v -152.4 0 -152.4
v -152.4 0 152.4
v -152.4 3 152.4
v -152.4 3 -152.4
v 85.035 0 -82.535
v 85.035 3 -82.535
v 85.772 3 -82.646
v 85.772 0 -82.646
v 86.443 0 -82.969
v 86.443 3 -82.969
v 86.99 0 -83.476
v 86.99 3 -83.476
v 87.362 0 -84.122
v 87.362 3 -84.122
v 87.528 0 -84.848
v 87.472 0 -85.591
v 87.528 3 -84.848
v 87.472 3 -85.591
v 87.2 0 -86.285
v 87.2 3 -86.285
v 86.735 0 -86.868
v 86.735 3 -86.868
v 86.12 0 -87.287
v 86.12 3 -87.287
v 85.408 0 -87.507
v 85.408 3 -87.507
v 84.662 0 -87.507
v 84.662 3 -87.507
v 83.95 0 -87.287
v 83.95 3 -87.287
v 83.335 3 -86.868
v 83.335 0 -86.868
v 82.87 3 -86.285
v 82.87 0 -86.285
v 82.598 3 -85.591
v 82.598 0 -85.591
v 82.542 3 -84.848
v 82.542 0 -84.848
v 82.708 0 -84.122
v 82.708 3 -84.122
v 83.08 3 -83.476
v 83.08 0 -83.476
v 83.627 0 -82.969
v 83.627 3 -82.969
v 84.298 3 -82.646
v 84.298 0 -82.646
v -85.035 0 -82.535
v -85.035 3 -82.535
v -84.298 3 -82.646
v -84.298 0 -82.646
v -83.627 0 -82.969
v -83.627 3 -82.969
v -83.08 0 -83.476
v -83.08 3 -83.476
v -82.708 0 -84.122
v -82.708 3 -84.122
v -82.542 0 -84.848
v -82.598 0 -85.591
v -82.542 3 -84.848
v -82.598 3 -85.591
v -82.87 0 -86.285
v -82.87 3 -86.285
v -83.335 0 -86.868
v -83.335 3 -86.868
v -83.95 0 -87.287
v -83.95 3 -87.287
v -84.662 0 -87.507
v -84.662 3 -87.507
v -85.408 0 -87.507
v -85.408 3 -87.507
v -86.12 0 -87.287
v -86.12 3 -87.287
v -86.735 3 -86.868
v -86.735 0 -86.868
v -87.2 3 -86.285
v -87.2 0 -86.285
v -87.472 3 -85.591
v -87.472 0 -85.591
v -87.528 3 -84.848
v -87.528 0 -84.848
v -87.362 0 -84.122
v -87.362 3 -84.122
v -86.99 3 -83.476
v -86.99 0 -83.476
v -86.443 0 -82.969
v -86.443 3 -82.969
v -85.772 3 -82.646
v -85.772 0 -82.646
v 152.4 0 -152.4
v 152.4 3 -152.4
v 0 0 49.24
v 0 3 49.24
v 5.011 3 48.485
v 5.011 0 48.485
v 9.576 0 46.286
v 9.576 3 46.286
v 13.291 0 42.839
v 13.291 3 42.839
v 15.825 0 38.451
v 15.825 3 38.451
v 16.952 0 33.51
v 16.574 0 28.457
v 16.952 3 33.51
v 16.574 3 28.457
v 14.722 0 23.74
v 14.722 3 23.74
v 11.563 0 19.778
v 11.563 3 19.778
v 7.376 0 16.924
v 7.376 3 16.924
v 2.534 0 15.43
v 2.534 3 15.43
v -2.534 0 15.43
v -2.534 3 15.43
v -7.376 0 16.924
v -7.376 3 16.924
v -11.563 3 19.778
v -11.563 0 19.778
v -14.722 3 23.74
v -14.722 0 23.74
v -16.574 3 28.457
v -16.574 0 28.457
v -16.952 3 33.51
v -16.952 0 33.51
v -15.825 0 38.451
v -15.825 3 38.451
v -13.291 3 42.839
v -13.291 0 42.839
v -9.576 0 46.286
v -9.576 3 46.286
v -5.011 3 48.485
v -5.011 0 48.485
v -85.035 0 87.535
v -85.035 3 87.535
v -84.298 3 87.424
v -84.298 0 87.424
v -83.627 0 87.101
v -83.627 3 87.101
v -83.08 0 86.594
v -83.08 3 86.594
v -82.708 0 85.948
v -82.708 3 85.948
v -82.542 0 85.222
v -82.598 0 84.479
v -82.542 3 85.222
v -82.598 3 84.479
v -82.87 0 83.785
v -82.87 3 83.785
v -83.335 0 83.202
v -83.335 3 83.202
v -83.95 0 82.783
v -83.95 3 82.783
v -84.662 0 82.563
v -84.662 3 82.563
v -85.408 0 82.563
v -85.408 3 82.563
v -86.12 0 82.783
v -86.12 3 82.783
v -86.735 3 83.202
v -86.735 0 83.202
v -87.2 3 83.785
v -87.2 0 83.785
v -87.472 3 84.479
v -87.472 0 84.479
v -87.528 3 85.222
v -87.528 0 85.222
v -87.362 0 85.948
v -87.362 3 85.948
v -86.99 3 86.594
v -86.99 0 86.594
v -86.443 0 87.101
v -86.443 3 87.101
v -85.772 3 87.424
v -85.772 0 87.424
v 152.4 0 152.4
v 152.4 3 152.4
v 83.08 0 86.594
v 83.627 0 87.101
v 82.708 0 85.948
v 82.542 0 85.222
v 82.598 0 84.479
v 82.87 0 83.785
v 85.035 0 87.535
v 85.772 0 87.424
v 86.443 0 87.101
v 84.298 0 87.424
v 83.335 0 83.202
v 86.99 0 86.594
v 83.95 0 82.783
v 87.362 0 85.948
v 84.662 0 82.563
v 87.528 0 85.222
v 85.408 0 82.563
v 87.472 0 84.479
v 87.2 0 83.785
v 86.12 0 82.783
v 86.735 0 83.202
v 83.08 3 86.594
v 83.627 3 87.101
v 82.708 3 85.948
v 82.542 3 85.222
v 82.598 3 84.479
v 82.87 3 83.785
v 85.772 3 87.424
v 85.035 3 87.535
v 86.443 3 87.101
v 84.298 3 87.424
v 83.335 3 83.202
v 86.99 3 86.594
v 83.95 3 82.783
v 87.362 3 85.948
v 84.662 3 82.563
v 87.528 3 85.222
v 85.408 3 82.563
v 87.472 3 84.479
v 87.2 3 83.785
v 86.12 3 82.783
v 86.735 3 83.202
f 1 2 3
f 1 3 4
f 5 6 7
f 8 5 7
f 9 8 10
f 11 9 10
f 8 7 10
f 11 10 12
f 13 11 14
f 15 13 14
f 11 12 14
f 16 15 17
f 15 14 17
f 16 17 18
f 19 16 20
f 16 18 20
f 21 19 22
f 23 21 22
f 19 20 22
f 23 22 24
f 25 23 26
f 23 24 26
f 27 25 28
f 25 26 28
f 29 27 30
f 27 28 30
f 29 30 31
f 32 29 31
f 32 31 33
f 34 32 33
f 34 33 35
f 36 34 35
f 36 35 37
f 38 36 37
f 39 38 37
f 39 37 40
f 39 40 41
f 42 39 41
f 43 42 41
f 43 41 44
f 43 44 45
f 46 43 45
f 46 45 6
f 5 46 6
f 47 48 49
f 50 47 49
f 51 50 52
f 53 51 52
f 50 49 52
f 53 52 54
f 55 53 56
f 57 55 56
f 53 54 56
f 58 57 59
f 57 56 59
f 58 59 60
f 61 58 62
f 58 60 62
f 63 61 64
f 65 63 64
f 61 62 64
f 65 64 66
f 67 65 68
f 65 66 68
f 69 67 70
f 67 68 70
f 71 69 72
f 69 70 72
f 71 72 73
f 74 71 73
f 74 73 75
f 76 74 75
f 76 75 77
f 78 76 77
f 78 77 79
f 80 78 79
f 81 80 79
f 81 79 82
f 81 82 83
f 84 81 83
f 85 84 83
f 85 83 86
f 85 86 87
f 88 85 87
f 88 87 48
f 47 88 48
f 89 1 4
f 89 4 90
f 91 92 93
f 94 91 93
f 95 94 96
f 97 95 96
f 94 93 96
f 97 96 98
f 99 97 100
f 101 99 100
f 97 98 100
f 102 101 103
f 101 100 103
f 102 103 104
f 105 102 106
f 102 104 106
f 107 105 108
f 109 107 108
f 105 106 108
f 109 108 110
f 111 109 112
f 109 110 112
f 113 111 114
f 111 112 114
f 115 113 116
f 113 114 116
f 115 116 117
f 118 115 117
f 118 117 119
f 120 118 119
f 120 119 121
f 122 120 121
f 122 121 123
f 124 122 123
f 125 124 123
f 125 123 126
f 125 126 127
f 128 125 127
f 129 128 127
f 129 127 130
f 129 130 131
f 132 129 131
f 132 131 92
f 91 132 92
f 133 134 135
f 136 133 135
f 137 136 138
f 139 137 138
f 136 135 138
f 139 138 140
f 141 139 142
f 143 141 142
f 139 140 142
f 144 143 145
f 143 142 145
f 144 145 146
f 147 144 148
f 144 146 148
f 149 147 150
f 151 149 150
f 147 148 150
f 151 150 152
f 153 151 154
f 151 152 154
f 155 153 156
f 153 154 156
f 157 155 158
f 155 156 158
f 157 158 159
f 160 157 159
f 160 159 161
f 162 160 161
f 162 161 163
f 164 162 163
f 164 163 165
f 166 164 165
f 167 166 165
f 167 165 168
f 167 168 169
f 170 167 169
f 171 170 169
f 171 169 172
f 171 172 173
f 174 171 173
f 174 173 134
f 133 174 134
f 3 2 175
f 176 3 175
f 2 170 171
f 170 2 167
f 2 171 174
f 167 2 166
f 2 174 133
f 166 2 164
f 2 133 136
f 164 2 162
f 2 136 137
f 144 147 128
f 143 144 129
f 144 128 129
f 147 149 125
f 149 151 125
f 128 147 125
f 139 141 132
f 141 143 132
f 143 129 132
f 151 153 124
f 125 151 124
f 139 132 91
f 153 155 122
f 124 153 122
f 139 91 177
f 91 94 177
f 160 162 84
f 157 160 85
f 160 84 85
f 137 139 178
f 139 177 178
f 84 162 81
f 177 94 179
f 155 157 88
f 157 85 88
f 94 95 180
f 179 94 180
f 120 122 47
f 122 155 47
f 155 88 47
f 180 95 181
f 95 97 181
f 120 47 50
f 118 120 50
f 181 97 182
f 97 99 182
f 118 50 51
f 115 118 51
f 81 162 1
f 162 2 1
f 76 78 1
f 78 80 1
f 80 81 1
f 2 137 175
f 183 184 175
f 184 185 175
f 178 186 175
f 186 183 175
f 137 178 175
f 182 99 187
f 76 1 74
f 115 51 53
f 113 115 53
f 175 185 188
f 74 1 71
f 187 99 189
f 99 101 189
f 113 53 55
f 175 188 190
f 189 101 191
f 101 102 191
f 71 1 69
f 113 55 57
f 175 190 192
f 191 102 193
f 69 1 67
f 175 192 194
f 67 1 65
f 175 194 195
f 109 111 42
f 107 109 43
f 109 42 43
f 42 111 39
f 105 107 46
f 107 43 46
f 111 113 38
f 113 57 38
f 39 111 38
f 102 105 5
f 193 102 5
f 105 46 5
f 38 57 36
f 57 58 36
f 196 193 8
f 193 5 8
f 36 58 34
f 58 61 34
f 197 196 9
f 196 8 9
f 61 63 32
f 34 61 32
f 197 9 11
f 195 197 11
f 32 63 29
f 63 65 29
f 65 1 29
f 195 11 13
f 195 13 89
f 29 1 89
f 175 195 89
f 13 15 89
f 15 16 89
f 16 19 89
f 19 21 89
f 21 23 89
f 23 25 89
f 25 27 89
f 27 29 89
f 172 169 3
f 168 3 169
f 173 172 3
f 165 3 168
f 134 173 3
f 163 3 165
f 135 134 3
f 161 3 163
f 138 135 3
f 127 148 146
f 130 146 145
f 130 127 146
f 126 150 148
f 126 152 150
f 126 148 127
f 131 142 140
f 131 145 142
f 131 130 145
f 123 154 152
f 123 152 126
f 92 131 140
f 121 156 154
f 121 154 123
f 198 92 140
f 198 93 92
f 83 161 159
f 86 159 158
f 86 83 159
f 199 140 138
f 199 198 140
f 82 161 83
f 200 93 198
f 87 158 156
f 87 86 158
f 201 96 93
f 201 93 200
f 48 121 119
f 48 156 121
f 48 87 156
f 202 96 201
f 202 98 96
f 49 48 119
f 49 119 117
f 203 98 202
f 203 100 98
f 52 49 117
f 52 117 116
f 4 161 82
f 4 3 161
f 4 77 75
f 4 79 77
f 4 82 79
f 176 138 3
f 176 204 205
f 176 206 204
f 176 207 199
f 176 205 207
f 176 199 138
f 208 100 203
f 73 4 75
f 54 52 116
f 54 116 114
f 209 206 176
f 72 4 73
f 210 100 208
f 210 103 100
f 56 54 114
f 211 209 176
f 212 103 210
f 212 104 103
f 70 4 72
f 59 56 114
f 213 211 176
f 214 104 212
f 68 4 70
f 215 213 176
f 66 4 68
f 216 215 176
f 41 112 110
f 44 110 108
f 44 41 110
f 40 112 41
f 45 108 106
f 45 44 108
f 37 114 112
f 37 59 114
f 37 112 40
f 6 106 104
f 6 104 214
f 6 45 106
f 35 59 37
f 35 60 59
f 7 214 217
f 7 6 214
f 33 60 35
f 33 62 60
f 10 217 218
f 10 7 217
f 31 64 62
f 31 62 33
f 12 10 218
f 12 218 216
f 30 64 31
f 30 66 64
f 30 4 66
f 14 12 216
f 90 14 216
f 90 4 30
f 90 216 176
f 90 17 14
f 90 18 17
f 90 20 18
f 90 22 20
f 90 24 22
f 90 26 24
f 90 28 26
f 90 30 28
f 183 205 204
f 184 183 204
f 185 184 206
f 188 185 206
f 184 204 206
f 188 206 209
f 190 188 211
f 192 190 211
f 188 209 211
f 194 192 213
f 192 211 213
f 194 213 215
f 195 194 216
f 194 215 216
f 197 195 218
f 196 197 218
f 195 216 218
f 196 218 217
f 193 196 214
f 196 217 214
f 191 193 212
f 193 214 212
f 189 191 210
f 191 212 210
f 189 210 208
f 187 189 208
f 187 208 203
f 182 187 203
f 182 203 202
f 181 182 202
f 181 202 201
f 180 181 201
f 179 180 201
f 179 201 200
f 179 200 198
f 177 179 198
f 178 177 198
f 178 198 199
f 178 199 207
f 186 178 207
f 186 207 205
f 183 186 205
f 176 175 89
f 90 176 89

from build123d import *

# Parameters (mm, degrees)
SKETCH2_W           = 304.8
SKETCH2_H           = 304.8
BOSS_EXTRUDE1_DEPTH = 3
SKETCH3_R           = 2.5
CUT_EXTRUDE1_DEPTH  = 216.547025032
SKETCH4_R           = 17
CUT_EXTRUDE2_DEPTH  = 216.547025032


with BuildPart() as part:
    # Sketch2 → Boss-Extrude1 (new body)
    with BuildSketch(Plane(origin=(0, 0, 0), x_dir=(1, 0, 0), z_dir=(0, 1, 0))):
        Rectangle(SKETCH2_W, SKETCH2_H)
    extrude(amount=BOSS_EXTRUDE1_DEPTH)

    # Sketch3 → Cut-Extrude1 (cut, through all)
    with BuildSketch(Plane(origin=(0, 3, 0), x_dir=(1, 0, 0), z_dir=(0, 1, 0))):
        with Locations(Location((-85.035, 85.035, 0), (0, 0, 270))):
            Circle(SKETCH3_R)
        with Locations(Location((85.035, 85.035, 0), (0, 0, 270))):
            Circle(SKETCH3_R)
        with Locations(Location((-85.035, -85.035, 0), (0, 0, 270))):
            Circle(SKETCH3_R)
        with Locations(Location((85.035, -85.035, 0), (0, 0, 270))):
            Circle(SKETCH3_R)
    extrude(amount=-CUT_EXTRUDE1_DEPTH, mode=Mode.SUBTRACT)

    # Sketch4 → Cut-Extrude2 (cut, through all)
    with BuildSketch(Plane(origin=(0, 3, 0), x_dir=(1, 0, 0), z_dir=(0, 1, 0))):
        with Locations(Location((0, -32.24, 0), (0, 0, 270))):
            Circle(SKETCH4_R)
    extrude(amount=-CUT_EXTRUDE2_DEPTH, mode=Mode.SUBTRACT)


solid = part.part
